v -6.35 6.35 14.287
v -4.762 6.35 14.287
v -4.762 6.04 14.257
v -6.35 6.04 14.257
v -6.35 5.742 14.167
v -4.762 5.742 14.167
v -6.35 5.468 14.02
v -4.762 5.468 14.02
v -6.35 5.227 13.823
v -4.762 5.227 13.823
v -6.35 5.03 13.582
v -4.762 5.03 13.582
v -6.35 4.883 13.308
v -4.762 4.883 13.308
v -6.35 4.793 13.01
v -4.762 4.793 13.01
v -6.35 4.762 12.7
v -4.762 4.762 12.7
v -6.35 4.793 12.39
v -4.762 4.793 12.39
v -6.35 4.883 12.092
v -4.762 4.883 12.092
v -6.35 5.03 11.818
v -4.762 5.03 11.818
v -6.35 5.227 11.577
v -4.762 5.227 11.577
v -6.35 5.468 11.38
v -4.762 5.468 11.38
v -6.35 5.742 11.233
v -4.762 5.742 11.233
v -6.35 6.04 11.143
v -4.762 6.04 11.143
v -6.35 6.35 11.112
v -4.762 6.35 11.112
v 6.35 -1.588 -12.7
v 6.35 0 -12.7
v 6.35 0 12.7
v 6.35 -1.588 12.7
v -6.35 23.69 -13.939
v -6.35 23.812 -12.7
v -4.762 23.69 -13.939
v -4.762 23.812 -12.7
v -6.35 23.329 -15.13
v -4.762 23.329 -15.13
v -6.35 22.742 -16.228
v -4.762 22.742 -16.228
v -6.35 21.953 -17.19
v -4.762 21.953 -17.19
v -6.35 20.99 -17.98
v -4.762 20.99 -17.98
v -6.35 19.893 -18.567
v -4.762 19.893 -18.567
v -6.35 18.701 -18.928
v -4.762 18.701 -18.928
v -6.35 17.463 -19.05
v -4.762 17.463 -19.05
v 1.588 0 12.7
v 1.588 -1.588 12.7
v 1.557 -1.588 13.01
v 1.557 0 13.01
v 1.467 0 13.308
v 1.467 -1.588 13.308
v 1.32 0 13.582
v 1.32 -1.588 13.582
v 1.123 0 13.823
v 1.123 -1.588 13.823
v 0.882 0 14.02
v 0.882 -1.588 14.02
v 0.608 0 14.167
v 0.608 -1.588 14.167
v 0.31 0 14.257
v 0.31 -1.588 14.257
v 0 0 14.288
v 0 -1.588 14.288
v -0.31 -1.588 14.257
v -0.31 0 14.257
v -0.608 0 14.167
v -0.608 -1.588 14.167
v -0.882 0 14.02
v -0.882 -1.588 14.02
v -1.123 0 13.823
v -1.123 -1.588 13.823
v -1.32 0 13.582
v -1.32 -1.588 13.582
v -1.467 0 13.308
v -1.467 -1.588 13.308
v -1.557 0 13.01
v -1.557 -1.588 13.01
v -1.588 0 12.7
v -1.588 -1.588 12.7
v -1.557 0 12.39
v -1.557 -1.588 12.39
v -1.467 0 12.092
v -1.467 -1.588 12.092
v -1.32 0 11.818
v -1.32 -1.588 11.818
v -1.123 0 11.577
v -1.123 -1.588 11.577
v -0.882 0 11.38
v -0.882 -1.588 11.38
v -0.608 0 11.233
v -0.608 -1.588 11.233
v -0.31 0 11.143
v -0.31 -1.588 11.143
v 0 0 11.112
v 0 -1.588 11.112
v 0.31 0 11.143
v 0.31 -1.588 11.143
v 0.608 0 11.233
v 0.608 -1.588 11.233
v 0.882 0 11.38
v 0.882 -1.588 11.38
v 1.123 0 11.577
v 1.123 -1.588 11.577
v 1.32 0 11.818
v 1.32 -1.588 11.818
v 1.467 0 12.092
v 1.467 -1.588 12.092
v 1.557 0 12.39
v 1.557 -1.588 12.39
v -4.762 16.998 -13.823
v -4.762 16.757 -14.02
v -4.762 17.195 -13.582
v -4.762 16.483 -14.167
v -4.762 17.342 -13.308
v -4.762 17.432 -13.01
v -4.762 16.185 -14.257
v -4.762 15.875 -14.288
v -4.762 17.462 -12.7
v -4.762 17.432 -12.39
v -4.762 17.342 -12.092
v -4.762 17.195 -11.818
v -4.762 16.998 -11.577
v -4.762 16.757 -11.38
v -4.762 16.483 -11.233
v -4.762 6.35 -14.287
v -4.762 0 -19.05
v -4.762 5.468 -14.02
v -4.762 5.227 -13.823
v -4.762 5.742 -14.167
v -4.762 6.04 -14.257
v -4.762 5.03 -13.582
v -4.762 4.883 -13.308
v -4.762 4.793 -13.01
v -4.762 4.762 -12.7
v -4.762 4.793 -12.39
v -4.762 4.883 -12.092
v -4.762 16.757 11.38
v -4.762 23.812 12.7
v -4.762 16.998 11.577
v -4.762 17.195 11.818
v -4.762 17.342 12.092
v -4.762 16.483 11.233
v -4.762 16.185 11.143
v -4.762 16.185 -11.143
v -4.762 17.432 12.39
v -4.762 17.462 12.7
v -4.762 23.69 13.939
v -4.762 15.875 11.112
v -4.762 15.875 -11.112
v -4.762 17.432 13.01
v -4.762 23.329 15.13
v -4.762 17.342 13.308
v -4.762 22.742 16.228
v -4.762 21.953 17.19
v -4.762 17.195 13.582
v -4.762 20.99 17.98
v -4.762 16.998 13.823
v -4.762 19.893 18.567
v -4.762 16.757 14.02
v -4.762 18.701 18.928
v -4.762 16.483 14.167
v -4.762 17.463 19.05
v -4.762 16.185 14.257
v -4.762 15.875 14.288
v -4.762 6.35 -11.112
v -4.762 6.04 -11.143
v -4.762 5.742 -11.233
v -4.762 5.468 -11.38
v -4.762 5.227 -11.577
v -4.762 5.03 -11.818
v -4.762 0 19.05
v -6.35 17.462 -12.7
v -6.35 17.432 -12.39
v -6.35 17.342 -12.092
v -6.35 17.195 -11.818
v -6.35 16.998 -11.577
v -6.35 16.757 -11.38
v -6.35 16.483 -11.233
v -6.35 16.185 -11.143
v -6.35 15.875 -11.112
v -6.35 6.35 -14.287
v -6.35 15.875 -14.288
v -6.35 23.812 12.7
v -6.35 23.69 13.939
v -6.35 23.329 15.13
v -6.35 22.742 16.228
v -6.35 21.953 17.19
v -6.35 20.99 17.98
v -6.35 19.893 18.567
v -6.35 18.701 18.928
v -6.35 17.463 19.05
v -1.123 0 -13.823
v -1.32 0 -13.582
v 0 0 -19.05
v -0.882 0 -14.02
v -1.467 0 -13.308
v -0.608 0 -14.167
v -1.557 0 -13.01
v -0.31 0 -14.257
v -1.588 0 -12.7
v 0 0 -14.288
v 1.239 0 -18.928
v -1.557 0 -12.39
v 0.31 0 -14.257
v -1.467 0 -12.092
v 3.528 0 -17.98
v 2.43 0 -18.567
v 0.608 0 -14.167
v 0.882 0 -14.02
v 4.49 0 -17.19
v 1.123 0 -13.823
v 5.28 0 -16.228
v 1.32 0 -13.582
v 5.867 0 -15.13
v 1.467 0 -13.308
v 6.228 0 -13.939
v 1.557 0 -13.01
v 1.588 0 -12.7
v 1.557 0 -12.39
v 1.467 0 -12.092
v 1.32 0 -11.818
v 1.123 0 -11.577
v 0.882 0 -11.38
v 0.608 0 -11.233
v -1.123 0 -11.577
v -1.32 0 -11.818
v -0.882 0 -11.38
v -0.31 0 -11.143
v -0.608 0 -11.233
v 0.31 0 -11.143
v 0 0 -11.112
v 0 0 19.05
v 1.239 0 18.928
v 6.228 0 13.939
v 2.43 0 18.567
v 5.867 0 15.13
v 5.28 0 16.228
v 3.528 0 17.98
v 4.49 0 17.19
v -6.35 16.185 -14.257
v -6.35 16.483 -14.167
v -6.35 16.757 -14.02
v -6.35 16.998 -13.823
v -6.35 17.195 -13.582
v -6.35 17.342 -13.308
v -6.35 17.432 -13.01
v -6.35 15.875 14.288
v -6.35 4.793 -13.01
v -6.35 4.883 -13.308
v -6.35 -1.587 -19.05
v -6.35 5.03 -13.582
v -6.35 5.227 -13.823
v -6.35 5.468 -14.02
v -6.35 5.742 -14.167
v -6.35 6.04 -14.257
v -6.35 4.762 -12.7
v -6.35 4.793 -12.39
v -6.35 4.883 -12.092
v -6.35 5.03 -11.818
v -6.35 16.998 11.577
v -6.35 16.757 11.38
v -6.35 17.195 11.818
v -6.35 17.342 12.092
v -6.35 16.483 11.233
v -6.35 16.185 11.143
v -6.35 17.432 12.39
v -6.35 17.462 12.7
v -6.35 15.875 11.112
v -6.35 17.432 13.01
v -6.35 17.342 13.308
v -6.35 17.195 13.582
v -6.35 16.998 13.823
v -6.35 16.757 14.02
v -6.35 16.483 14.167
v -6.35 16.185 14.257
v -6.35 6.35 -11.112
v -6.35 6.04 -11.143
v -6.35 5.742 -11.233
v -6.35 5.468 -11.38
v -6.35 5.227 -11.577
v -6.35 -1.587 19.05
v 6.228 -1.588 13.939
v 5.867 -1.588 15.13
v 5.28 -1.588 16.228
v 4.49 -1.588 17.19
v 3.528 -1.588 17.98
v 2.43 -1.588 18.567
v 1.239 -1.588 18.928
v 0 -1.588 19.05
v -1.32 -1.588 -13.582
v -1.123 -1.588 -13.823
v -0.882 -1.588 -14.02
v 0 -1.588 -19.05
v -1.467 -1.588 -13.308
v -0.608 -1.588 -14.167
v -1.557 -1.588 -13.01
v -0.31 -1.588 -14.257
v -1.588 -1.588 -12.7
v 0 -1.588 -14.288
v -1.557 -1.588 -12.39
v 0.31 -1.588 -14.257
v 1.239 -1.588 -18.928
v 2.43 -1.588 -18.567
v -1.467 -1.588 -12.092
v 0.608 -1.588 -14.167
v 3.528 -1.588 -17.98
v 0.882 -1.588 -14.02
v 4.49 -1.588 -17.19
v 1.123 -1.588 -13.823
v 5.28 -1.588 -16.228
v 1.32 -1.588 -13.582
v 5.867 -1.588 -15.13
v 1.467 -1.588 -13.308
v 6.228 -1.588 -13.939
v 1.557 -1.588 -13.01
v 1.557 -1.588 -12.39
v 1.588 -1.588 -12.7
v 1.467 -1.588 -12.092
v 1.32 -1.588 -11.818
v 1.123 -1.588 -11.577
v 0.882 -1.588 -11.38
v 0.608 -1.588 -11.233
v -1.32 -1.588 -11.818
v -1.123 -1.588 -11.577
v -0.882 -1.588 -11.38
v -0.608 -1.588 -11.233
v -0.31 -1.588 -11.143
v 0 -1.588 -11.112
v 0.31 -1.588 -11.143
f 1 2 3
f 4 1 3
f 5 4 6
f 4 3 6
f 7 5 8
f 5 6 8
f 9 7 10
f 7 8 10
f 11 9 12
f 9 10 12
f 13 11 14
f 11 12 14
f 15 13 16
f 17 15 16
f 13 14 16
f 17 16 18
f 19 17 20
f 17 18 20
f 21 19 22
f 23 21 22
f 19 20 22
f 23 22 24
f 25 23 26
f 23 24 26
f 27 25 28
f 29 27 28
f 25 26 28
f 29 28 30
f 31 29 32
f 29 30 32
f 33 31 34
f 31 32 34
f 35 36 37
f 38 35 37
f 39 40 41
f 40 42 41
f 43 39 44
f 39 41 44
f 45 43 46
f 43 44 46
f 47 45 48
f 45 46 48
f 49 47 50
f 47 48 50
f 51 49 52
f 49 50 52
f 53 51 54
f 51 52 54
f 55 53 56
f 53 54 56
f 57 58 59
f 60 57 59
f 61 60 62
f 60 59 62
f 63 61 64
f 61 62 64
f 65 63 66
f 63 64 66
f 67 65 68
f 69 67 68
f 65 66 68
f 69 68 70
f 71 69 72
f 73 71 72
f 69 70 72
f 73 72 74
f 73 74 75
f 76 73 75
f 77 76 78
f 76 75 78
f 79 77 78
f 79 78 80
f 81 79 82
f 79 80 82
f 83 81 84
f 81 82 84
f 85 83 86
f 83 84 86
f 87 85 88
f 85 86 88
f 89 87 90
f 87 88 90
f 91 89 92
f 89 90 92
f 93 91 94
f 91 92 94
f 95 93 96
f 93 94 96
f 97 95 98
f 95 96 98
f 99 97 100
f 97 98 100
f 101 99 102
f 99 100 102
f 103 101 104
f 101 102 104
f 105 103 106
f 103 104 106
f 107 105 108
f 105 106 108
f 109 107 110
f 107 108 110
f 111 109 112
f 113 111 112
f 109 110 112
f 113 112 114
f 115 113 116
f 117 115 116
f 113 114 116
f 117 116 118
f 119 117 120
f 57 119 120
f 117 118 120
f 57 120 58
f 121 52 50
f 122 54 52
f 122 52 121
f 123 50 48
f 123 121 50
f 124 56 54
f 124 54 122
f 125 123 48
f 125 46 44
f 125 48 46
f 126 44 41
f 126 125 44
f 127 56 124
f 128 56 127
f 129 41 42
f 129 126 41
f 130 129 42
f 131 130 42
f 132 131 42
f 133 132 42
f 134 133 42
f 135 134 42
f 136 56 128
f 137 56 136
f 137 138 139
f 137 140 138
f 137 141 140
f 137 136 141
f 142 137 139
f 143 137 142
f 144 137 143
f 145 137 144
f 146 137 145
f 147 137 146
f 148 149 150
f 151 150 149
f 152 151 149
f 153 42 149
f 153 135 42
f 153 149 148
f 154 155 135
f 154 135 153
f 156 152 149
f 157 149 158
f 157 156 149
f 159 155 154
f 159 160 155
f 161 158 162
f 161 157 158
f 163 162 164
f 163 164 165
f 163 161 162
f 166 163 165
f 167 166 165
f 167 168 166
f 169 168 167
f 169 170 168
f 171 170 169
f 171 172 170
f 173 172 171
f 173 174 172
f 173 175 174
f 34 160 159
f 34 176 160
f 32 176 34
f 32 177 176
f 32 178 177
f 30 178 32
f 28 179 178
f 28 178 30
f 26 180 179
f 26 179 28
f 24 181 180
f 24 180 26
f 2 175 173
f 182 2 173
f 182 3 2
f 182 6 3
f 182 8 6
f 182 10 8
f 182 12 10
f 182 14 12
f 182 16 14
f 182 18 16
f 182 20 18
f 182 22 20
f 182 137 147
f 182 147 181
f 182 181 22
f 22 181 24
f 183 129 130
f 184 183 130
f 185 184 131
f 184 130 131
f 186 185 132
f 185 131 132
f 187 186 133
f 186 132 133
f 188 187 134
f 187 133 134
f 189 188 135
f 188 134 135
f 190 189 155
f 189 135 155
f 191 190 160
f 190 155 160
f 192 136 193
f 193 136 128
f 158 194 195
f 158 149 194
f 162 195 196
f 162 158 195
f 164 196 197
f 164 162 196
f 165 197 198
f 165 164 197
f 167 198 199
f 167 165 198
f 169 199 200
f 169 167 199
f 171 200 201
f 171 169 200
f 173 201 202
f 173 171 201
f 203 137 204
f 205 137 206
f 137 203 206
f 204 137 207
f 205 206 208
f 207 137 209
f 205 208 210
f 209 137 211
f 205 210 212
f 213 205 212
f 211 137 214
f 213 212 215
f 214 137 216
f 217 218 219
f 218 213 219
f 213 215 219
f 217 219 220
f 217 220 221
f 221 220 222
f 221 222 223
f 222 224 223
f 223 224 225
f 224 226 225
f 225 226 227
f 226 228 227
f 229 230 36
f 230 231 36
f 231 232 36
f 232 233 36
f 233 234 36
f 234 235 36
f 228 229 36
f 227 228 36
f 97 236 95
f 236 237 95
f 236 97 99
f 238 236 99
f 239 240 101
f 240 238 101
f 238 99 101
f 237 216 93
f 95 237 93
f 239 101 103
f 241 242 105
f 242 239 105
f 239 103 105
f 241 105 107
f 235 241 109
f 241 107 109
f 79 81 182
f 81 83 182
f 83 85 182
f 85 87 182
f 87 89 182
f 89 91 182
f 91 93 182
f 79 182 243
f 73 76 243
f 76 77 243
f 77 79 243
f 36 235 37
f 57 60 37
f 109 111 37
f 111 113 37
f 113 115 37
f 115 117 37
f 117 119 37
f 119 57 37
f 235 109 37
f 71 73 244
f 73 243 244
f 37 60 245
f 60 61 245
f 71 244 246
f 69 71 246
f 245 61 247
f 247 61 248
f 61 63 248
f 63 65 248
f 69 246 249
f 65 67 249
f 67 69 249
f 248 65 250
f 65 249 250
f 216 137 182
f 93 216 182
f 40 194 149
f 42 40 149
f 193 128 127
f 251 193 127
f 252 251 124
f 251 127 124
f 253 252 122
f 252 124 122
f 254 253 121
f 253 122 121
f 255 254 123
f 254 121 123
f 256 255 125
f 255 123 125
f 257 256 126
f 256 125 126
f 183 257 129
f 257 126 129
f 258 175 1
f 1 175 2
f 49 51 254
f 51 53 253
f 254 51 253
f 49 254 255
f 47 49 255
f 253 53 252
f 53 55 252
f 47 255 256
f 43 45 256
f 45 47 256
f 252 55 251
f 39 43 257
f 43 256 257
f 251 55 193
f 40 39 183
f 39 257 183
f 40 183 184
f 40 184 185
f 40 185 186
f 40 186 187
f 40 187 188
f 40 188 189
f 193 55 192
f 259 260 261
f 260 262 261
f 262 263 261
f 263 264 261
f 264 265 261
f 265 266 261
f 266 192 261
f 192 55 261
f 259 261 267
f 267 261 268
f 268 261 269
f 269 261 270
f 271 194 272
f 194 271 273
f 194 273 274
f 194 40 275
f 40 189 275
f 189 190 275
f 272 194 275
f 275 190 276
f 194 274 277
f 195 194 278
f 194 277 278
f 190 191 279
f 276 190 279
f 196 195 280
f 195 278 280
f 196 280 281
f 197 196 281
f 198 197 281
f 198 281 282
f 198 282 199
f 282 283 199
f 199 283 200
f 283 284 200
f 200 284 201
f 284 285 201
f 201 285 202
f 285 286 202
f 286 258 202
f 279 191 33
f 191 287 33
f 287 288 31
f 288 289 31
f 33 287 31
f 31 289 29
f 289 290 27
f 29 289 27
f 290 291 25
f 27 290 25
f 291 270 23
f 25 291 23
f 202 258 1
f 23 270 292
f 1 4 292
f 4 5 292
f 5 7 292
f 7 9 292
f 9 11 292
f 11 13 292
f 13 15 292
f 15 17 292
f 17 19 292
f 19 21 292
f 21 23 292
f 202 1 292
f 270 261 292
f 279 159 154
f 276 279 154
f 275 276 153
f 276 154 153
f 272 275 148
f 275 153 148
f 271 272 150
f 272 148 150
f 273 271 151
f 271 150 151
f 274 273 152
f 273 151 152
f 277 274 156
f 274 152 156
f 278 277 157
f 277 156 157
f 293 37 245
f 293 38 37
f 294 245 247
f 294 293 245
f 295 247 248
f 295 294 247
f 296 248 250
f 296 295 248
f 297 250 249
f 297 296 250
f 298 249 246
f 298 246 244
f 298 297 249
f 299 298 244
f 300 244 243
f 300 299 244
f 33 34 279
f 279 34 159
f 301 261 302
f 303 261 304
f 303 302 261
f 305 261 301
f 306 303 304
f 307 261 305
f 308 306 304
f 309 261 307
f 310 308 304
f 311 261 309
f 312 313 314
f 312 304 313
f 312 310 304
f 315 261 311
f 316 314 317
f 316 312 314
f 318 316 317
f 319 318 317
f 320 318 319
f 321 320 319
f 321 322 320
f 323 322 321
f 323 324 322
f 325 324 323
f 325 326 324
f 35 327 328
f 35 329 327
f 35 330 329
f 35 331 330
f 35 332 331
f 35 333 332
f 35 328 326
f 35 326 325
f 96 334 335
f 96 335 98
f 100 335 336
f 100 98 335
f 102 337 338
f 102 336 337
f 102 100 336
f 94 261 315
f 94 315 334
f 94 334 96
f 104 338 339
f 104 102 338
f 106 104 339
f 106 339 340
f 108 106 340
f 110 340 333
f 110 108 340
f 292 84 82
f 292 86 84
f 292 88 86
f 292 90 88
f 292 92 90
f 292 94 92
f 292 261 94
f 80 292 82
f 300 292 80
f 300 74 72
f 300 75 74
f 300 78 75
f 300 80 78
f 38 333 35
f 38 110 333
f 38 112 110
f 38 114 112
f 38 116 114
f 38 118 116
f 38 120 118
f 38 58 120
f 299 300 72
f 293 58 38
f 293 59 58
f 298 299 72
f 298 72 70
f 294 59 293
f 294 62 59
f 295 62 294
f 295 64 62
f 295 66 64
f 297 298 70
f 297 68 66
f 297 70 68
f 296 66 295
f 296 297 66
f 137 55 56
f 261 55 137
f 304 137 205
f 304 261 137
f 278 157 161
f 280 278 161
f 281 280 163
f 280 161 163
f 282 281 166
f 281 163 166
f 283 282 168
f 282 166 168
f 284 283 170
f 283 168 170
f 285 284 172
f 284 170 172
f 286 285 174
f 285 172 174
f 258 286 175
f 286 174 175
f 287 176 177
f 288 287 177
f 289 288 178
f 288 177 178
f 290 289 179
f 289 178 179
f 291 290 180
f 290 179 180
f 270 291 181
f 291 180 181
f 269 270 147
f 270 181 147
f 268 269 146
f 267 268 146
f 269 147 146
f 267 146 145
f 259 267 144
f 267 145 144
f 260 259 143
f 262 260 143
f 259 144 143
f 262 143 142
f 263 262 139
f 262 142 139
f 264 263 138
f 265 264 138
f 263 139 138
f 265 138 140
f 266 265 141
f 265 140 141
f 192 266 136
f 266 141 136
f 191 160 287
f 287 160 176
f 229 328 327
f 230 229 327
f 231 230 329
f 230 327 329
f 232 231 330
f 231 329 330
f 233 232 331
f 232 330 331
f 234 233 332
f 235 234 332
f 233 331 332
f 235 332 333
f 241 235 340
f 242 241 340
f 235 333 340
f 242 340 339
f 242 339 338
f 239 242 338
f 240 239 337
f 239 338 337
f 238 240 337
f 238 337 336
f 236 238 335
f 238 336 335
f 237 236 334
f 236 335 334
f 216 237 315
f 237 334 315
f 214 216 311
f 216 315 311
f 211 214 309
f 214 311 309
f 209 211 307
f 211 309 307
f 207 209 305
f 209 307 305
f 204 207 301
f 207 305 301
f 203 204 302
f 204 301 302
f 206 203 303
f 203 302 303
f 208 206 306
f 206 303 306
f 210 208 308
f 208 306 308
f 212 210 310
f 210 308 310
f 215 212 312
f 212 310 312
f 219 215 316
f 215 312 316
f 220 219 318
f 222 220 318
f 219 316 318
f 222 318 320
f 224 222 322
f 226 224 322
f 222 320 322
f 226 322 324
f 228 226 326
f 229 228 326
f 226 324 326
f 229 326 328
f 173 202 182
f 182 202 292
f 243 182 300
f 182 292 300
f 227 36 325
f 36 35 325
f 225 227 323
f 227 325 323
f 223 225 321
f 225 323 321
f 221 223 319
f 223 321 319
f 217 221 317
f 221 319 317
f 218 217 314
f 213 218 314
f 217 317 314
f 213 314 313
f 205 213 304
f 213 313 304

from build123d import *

# Parameters (mm, degrees)
F0_W     = 12.7
F0_H     = 38.1
F1_DEPTH = 1.5875
F2_W     = 1.5875
F2_H     = 38.1
F3_DEPTH = 25.4
F4_R     = 6.35
F5_R     = 1.5875
F6_DEPTH = 1.5875
F8_DEPTH = 1.5875


with BuildPart() as f1:
    # F0 (on Front) → F1 (new body)
    with BuildSketch(Plane.XZ):
        Rectangle(F0_W, F0_H)
    extrude(amount=F1_DEPTH)

    # F2 (on face) → F3 (join)
    with BuildSketch(Plane.XZ.offset(1.5875)):
        with Locations((-5.55625, 0)):
            Rectangle(F2_W, F2_H)
    extrude(amount=-F3_DEPTH)

    # F4
    f4_edges = [f1.edges().sort_by_distance(p)[0] for p in [
        (6.35, -0.79375, 19.05),
        (-5.55625, 23.8125, 19.05),
        (6.35, -0.79375, -19.05),
        (-5.55625, 23.8125, -19.05),
    ]]
    fillet(f4_edges, radius=F4_R)

    # F5 (on face) → F6 (cut, through all)
    with BuildSketch(Plane.XZ.offset(1.5875)):
        with Locations((0, 12.7)):
            Circle(F5_R)
        with Locations((0, -12.7)):
            Circle(F5_R)
    extrude(amount=-F6_DEPTH, mode=Mode.SUBTRACT)

    # F7 (on face) → F8 (cut, through all)
    with BuildSketch(Plane.YZ.offset(-4.7625)):
        with BuildLine():
            ThreePointArc((7.9375, 12.7), (7.4725320151, 13.8225320151), (6.35, 14.2875))
            Line((6.35, 14.2875), (6.35, 11.1125))
            ThreePointArc((6.35, 11.1125), (7.4725320151, 11.5774679849), (7.9375, 12.7))
        make_face()
        with BuildLine():
            Line((15.875, 14.2875), (6.35, 14.2875))
            ThreePointArc((6.35, 14.2875), (7.4725320151, 13.8225320151), (7.9375, 12.7))
            ThreePointArc((7.9375, 12.7), (7.4725320151, 11.5774679849), (6.35, 11.1125))
            Line((6.35, 11.1125), (15.875, 11.1125))
            ThreePointArc((15.875, 11.1125), (14.2875, 12.7), (15.875, 14.2875))
        make_face()
        with BuildLine():
            Line((6.35, 11.1125), (6.35, 14.2875))
            ThreePointArc((6.35, 14.2875), (4.7625, 12.7), (6.35, 11.1125))
        make_face()
        with BuildLine():
            ThreePointArc((17.4625, 12.7), (16.9975320151, 13.8225320151), (15.875, 14.2875))
            Line((15.875, 14.2875), (15.875, 11.1125))
            ThreePointArc((15.875, 11.1125), (16.9975320151, 11.5774679849), (17.4625, 12.7))
        make_face()
        with BuildLine():
            Line((15.875, 11.1125), (15.875, 14.2875))
            ThreePointArc((15.875, 14.2875), (14.2875, 12.7), (15.875, 11.1125))
        make_face()
        with BuildLine():
            ThreePointArc((7.9375, -12.7), (7.4725320151, -11.5774679849), (6.35, -11.1125))
            Line((6.35, -11.1125), (6.35, -14.2875))
            ThreePointArc((6.35, -14.2875), (7.4725320151, -13.8225320151), (7.9375, -12.7))
        make_face()
        with BuildLine():
            Line((15.875, -11.1125), (6.35, -11.1125))
            ThreePointArc((6.35, -11.1125), (7.4725320151, -11.5774679849), (7.9375, -12.7))
            ThreePointArc((7.9375, -12.7), (7.4725320151, -13.8225320151), (6.35, -14.2875))
            Line((6.35, -14.2875), (15.875, -14.2875))
            ThreePointArc((15.875, -14.2875), (14.2875, -12.7), (15.875, -11.1125))
        make_face()
        with BuildLine():
            Line((6.35, -14.2875), (6.35, -11.1125))
            ThreePointArc((6.35, -11.1125), (4.7625, -12.7), (6.35, -14.2875))
        make_face()
        with BuildLine():
            ThreePointArc((17.4625, -12.7), (16.9975320151, -11.5774679849), (15.875, -11.1125))
            Line((15.875, -11.1125), (15.875, -14.2875))
            ThreePointArc((15.875, -14.2875), (16.9975320151, -13.8225320151), (17.4625, -12.7))
        make_face()
        with BuildLine():
            Line((15.875, -14.2875), (15.875, -11.1125))
            ThreePointArc((15.875, -11.1125), (14.2875, -12.7), (15.875, -14.2875))
        make_face()
    extrude(amount=-F8_DEPTH, mode=Mode.SUBTRACT)


solid = f1.part
